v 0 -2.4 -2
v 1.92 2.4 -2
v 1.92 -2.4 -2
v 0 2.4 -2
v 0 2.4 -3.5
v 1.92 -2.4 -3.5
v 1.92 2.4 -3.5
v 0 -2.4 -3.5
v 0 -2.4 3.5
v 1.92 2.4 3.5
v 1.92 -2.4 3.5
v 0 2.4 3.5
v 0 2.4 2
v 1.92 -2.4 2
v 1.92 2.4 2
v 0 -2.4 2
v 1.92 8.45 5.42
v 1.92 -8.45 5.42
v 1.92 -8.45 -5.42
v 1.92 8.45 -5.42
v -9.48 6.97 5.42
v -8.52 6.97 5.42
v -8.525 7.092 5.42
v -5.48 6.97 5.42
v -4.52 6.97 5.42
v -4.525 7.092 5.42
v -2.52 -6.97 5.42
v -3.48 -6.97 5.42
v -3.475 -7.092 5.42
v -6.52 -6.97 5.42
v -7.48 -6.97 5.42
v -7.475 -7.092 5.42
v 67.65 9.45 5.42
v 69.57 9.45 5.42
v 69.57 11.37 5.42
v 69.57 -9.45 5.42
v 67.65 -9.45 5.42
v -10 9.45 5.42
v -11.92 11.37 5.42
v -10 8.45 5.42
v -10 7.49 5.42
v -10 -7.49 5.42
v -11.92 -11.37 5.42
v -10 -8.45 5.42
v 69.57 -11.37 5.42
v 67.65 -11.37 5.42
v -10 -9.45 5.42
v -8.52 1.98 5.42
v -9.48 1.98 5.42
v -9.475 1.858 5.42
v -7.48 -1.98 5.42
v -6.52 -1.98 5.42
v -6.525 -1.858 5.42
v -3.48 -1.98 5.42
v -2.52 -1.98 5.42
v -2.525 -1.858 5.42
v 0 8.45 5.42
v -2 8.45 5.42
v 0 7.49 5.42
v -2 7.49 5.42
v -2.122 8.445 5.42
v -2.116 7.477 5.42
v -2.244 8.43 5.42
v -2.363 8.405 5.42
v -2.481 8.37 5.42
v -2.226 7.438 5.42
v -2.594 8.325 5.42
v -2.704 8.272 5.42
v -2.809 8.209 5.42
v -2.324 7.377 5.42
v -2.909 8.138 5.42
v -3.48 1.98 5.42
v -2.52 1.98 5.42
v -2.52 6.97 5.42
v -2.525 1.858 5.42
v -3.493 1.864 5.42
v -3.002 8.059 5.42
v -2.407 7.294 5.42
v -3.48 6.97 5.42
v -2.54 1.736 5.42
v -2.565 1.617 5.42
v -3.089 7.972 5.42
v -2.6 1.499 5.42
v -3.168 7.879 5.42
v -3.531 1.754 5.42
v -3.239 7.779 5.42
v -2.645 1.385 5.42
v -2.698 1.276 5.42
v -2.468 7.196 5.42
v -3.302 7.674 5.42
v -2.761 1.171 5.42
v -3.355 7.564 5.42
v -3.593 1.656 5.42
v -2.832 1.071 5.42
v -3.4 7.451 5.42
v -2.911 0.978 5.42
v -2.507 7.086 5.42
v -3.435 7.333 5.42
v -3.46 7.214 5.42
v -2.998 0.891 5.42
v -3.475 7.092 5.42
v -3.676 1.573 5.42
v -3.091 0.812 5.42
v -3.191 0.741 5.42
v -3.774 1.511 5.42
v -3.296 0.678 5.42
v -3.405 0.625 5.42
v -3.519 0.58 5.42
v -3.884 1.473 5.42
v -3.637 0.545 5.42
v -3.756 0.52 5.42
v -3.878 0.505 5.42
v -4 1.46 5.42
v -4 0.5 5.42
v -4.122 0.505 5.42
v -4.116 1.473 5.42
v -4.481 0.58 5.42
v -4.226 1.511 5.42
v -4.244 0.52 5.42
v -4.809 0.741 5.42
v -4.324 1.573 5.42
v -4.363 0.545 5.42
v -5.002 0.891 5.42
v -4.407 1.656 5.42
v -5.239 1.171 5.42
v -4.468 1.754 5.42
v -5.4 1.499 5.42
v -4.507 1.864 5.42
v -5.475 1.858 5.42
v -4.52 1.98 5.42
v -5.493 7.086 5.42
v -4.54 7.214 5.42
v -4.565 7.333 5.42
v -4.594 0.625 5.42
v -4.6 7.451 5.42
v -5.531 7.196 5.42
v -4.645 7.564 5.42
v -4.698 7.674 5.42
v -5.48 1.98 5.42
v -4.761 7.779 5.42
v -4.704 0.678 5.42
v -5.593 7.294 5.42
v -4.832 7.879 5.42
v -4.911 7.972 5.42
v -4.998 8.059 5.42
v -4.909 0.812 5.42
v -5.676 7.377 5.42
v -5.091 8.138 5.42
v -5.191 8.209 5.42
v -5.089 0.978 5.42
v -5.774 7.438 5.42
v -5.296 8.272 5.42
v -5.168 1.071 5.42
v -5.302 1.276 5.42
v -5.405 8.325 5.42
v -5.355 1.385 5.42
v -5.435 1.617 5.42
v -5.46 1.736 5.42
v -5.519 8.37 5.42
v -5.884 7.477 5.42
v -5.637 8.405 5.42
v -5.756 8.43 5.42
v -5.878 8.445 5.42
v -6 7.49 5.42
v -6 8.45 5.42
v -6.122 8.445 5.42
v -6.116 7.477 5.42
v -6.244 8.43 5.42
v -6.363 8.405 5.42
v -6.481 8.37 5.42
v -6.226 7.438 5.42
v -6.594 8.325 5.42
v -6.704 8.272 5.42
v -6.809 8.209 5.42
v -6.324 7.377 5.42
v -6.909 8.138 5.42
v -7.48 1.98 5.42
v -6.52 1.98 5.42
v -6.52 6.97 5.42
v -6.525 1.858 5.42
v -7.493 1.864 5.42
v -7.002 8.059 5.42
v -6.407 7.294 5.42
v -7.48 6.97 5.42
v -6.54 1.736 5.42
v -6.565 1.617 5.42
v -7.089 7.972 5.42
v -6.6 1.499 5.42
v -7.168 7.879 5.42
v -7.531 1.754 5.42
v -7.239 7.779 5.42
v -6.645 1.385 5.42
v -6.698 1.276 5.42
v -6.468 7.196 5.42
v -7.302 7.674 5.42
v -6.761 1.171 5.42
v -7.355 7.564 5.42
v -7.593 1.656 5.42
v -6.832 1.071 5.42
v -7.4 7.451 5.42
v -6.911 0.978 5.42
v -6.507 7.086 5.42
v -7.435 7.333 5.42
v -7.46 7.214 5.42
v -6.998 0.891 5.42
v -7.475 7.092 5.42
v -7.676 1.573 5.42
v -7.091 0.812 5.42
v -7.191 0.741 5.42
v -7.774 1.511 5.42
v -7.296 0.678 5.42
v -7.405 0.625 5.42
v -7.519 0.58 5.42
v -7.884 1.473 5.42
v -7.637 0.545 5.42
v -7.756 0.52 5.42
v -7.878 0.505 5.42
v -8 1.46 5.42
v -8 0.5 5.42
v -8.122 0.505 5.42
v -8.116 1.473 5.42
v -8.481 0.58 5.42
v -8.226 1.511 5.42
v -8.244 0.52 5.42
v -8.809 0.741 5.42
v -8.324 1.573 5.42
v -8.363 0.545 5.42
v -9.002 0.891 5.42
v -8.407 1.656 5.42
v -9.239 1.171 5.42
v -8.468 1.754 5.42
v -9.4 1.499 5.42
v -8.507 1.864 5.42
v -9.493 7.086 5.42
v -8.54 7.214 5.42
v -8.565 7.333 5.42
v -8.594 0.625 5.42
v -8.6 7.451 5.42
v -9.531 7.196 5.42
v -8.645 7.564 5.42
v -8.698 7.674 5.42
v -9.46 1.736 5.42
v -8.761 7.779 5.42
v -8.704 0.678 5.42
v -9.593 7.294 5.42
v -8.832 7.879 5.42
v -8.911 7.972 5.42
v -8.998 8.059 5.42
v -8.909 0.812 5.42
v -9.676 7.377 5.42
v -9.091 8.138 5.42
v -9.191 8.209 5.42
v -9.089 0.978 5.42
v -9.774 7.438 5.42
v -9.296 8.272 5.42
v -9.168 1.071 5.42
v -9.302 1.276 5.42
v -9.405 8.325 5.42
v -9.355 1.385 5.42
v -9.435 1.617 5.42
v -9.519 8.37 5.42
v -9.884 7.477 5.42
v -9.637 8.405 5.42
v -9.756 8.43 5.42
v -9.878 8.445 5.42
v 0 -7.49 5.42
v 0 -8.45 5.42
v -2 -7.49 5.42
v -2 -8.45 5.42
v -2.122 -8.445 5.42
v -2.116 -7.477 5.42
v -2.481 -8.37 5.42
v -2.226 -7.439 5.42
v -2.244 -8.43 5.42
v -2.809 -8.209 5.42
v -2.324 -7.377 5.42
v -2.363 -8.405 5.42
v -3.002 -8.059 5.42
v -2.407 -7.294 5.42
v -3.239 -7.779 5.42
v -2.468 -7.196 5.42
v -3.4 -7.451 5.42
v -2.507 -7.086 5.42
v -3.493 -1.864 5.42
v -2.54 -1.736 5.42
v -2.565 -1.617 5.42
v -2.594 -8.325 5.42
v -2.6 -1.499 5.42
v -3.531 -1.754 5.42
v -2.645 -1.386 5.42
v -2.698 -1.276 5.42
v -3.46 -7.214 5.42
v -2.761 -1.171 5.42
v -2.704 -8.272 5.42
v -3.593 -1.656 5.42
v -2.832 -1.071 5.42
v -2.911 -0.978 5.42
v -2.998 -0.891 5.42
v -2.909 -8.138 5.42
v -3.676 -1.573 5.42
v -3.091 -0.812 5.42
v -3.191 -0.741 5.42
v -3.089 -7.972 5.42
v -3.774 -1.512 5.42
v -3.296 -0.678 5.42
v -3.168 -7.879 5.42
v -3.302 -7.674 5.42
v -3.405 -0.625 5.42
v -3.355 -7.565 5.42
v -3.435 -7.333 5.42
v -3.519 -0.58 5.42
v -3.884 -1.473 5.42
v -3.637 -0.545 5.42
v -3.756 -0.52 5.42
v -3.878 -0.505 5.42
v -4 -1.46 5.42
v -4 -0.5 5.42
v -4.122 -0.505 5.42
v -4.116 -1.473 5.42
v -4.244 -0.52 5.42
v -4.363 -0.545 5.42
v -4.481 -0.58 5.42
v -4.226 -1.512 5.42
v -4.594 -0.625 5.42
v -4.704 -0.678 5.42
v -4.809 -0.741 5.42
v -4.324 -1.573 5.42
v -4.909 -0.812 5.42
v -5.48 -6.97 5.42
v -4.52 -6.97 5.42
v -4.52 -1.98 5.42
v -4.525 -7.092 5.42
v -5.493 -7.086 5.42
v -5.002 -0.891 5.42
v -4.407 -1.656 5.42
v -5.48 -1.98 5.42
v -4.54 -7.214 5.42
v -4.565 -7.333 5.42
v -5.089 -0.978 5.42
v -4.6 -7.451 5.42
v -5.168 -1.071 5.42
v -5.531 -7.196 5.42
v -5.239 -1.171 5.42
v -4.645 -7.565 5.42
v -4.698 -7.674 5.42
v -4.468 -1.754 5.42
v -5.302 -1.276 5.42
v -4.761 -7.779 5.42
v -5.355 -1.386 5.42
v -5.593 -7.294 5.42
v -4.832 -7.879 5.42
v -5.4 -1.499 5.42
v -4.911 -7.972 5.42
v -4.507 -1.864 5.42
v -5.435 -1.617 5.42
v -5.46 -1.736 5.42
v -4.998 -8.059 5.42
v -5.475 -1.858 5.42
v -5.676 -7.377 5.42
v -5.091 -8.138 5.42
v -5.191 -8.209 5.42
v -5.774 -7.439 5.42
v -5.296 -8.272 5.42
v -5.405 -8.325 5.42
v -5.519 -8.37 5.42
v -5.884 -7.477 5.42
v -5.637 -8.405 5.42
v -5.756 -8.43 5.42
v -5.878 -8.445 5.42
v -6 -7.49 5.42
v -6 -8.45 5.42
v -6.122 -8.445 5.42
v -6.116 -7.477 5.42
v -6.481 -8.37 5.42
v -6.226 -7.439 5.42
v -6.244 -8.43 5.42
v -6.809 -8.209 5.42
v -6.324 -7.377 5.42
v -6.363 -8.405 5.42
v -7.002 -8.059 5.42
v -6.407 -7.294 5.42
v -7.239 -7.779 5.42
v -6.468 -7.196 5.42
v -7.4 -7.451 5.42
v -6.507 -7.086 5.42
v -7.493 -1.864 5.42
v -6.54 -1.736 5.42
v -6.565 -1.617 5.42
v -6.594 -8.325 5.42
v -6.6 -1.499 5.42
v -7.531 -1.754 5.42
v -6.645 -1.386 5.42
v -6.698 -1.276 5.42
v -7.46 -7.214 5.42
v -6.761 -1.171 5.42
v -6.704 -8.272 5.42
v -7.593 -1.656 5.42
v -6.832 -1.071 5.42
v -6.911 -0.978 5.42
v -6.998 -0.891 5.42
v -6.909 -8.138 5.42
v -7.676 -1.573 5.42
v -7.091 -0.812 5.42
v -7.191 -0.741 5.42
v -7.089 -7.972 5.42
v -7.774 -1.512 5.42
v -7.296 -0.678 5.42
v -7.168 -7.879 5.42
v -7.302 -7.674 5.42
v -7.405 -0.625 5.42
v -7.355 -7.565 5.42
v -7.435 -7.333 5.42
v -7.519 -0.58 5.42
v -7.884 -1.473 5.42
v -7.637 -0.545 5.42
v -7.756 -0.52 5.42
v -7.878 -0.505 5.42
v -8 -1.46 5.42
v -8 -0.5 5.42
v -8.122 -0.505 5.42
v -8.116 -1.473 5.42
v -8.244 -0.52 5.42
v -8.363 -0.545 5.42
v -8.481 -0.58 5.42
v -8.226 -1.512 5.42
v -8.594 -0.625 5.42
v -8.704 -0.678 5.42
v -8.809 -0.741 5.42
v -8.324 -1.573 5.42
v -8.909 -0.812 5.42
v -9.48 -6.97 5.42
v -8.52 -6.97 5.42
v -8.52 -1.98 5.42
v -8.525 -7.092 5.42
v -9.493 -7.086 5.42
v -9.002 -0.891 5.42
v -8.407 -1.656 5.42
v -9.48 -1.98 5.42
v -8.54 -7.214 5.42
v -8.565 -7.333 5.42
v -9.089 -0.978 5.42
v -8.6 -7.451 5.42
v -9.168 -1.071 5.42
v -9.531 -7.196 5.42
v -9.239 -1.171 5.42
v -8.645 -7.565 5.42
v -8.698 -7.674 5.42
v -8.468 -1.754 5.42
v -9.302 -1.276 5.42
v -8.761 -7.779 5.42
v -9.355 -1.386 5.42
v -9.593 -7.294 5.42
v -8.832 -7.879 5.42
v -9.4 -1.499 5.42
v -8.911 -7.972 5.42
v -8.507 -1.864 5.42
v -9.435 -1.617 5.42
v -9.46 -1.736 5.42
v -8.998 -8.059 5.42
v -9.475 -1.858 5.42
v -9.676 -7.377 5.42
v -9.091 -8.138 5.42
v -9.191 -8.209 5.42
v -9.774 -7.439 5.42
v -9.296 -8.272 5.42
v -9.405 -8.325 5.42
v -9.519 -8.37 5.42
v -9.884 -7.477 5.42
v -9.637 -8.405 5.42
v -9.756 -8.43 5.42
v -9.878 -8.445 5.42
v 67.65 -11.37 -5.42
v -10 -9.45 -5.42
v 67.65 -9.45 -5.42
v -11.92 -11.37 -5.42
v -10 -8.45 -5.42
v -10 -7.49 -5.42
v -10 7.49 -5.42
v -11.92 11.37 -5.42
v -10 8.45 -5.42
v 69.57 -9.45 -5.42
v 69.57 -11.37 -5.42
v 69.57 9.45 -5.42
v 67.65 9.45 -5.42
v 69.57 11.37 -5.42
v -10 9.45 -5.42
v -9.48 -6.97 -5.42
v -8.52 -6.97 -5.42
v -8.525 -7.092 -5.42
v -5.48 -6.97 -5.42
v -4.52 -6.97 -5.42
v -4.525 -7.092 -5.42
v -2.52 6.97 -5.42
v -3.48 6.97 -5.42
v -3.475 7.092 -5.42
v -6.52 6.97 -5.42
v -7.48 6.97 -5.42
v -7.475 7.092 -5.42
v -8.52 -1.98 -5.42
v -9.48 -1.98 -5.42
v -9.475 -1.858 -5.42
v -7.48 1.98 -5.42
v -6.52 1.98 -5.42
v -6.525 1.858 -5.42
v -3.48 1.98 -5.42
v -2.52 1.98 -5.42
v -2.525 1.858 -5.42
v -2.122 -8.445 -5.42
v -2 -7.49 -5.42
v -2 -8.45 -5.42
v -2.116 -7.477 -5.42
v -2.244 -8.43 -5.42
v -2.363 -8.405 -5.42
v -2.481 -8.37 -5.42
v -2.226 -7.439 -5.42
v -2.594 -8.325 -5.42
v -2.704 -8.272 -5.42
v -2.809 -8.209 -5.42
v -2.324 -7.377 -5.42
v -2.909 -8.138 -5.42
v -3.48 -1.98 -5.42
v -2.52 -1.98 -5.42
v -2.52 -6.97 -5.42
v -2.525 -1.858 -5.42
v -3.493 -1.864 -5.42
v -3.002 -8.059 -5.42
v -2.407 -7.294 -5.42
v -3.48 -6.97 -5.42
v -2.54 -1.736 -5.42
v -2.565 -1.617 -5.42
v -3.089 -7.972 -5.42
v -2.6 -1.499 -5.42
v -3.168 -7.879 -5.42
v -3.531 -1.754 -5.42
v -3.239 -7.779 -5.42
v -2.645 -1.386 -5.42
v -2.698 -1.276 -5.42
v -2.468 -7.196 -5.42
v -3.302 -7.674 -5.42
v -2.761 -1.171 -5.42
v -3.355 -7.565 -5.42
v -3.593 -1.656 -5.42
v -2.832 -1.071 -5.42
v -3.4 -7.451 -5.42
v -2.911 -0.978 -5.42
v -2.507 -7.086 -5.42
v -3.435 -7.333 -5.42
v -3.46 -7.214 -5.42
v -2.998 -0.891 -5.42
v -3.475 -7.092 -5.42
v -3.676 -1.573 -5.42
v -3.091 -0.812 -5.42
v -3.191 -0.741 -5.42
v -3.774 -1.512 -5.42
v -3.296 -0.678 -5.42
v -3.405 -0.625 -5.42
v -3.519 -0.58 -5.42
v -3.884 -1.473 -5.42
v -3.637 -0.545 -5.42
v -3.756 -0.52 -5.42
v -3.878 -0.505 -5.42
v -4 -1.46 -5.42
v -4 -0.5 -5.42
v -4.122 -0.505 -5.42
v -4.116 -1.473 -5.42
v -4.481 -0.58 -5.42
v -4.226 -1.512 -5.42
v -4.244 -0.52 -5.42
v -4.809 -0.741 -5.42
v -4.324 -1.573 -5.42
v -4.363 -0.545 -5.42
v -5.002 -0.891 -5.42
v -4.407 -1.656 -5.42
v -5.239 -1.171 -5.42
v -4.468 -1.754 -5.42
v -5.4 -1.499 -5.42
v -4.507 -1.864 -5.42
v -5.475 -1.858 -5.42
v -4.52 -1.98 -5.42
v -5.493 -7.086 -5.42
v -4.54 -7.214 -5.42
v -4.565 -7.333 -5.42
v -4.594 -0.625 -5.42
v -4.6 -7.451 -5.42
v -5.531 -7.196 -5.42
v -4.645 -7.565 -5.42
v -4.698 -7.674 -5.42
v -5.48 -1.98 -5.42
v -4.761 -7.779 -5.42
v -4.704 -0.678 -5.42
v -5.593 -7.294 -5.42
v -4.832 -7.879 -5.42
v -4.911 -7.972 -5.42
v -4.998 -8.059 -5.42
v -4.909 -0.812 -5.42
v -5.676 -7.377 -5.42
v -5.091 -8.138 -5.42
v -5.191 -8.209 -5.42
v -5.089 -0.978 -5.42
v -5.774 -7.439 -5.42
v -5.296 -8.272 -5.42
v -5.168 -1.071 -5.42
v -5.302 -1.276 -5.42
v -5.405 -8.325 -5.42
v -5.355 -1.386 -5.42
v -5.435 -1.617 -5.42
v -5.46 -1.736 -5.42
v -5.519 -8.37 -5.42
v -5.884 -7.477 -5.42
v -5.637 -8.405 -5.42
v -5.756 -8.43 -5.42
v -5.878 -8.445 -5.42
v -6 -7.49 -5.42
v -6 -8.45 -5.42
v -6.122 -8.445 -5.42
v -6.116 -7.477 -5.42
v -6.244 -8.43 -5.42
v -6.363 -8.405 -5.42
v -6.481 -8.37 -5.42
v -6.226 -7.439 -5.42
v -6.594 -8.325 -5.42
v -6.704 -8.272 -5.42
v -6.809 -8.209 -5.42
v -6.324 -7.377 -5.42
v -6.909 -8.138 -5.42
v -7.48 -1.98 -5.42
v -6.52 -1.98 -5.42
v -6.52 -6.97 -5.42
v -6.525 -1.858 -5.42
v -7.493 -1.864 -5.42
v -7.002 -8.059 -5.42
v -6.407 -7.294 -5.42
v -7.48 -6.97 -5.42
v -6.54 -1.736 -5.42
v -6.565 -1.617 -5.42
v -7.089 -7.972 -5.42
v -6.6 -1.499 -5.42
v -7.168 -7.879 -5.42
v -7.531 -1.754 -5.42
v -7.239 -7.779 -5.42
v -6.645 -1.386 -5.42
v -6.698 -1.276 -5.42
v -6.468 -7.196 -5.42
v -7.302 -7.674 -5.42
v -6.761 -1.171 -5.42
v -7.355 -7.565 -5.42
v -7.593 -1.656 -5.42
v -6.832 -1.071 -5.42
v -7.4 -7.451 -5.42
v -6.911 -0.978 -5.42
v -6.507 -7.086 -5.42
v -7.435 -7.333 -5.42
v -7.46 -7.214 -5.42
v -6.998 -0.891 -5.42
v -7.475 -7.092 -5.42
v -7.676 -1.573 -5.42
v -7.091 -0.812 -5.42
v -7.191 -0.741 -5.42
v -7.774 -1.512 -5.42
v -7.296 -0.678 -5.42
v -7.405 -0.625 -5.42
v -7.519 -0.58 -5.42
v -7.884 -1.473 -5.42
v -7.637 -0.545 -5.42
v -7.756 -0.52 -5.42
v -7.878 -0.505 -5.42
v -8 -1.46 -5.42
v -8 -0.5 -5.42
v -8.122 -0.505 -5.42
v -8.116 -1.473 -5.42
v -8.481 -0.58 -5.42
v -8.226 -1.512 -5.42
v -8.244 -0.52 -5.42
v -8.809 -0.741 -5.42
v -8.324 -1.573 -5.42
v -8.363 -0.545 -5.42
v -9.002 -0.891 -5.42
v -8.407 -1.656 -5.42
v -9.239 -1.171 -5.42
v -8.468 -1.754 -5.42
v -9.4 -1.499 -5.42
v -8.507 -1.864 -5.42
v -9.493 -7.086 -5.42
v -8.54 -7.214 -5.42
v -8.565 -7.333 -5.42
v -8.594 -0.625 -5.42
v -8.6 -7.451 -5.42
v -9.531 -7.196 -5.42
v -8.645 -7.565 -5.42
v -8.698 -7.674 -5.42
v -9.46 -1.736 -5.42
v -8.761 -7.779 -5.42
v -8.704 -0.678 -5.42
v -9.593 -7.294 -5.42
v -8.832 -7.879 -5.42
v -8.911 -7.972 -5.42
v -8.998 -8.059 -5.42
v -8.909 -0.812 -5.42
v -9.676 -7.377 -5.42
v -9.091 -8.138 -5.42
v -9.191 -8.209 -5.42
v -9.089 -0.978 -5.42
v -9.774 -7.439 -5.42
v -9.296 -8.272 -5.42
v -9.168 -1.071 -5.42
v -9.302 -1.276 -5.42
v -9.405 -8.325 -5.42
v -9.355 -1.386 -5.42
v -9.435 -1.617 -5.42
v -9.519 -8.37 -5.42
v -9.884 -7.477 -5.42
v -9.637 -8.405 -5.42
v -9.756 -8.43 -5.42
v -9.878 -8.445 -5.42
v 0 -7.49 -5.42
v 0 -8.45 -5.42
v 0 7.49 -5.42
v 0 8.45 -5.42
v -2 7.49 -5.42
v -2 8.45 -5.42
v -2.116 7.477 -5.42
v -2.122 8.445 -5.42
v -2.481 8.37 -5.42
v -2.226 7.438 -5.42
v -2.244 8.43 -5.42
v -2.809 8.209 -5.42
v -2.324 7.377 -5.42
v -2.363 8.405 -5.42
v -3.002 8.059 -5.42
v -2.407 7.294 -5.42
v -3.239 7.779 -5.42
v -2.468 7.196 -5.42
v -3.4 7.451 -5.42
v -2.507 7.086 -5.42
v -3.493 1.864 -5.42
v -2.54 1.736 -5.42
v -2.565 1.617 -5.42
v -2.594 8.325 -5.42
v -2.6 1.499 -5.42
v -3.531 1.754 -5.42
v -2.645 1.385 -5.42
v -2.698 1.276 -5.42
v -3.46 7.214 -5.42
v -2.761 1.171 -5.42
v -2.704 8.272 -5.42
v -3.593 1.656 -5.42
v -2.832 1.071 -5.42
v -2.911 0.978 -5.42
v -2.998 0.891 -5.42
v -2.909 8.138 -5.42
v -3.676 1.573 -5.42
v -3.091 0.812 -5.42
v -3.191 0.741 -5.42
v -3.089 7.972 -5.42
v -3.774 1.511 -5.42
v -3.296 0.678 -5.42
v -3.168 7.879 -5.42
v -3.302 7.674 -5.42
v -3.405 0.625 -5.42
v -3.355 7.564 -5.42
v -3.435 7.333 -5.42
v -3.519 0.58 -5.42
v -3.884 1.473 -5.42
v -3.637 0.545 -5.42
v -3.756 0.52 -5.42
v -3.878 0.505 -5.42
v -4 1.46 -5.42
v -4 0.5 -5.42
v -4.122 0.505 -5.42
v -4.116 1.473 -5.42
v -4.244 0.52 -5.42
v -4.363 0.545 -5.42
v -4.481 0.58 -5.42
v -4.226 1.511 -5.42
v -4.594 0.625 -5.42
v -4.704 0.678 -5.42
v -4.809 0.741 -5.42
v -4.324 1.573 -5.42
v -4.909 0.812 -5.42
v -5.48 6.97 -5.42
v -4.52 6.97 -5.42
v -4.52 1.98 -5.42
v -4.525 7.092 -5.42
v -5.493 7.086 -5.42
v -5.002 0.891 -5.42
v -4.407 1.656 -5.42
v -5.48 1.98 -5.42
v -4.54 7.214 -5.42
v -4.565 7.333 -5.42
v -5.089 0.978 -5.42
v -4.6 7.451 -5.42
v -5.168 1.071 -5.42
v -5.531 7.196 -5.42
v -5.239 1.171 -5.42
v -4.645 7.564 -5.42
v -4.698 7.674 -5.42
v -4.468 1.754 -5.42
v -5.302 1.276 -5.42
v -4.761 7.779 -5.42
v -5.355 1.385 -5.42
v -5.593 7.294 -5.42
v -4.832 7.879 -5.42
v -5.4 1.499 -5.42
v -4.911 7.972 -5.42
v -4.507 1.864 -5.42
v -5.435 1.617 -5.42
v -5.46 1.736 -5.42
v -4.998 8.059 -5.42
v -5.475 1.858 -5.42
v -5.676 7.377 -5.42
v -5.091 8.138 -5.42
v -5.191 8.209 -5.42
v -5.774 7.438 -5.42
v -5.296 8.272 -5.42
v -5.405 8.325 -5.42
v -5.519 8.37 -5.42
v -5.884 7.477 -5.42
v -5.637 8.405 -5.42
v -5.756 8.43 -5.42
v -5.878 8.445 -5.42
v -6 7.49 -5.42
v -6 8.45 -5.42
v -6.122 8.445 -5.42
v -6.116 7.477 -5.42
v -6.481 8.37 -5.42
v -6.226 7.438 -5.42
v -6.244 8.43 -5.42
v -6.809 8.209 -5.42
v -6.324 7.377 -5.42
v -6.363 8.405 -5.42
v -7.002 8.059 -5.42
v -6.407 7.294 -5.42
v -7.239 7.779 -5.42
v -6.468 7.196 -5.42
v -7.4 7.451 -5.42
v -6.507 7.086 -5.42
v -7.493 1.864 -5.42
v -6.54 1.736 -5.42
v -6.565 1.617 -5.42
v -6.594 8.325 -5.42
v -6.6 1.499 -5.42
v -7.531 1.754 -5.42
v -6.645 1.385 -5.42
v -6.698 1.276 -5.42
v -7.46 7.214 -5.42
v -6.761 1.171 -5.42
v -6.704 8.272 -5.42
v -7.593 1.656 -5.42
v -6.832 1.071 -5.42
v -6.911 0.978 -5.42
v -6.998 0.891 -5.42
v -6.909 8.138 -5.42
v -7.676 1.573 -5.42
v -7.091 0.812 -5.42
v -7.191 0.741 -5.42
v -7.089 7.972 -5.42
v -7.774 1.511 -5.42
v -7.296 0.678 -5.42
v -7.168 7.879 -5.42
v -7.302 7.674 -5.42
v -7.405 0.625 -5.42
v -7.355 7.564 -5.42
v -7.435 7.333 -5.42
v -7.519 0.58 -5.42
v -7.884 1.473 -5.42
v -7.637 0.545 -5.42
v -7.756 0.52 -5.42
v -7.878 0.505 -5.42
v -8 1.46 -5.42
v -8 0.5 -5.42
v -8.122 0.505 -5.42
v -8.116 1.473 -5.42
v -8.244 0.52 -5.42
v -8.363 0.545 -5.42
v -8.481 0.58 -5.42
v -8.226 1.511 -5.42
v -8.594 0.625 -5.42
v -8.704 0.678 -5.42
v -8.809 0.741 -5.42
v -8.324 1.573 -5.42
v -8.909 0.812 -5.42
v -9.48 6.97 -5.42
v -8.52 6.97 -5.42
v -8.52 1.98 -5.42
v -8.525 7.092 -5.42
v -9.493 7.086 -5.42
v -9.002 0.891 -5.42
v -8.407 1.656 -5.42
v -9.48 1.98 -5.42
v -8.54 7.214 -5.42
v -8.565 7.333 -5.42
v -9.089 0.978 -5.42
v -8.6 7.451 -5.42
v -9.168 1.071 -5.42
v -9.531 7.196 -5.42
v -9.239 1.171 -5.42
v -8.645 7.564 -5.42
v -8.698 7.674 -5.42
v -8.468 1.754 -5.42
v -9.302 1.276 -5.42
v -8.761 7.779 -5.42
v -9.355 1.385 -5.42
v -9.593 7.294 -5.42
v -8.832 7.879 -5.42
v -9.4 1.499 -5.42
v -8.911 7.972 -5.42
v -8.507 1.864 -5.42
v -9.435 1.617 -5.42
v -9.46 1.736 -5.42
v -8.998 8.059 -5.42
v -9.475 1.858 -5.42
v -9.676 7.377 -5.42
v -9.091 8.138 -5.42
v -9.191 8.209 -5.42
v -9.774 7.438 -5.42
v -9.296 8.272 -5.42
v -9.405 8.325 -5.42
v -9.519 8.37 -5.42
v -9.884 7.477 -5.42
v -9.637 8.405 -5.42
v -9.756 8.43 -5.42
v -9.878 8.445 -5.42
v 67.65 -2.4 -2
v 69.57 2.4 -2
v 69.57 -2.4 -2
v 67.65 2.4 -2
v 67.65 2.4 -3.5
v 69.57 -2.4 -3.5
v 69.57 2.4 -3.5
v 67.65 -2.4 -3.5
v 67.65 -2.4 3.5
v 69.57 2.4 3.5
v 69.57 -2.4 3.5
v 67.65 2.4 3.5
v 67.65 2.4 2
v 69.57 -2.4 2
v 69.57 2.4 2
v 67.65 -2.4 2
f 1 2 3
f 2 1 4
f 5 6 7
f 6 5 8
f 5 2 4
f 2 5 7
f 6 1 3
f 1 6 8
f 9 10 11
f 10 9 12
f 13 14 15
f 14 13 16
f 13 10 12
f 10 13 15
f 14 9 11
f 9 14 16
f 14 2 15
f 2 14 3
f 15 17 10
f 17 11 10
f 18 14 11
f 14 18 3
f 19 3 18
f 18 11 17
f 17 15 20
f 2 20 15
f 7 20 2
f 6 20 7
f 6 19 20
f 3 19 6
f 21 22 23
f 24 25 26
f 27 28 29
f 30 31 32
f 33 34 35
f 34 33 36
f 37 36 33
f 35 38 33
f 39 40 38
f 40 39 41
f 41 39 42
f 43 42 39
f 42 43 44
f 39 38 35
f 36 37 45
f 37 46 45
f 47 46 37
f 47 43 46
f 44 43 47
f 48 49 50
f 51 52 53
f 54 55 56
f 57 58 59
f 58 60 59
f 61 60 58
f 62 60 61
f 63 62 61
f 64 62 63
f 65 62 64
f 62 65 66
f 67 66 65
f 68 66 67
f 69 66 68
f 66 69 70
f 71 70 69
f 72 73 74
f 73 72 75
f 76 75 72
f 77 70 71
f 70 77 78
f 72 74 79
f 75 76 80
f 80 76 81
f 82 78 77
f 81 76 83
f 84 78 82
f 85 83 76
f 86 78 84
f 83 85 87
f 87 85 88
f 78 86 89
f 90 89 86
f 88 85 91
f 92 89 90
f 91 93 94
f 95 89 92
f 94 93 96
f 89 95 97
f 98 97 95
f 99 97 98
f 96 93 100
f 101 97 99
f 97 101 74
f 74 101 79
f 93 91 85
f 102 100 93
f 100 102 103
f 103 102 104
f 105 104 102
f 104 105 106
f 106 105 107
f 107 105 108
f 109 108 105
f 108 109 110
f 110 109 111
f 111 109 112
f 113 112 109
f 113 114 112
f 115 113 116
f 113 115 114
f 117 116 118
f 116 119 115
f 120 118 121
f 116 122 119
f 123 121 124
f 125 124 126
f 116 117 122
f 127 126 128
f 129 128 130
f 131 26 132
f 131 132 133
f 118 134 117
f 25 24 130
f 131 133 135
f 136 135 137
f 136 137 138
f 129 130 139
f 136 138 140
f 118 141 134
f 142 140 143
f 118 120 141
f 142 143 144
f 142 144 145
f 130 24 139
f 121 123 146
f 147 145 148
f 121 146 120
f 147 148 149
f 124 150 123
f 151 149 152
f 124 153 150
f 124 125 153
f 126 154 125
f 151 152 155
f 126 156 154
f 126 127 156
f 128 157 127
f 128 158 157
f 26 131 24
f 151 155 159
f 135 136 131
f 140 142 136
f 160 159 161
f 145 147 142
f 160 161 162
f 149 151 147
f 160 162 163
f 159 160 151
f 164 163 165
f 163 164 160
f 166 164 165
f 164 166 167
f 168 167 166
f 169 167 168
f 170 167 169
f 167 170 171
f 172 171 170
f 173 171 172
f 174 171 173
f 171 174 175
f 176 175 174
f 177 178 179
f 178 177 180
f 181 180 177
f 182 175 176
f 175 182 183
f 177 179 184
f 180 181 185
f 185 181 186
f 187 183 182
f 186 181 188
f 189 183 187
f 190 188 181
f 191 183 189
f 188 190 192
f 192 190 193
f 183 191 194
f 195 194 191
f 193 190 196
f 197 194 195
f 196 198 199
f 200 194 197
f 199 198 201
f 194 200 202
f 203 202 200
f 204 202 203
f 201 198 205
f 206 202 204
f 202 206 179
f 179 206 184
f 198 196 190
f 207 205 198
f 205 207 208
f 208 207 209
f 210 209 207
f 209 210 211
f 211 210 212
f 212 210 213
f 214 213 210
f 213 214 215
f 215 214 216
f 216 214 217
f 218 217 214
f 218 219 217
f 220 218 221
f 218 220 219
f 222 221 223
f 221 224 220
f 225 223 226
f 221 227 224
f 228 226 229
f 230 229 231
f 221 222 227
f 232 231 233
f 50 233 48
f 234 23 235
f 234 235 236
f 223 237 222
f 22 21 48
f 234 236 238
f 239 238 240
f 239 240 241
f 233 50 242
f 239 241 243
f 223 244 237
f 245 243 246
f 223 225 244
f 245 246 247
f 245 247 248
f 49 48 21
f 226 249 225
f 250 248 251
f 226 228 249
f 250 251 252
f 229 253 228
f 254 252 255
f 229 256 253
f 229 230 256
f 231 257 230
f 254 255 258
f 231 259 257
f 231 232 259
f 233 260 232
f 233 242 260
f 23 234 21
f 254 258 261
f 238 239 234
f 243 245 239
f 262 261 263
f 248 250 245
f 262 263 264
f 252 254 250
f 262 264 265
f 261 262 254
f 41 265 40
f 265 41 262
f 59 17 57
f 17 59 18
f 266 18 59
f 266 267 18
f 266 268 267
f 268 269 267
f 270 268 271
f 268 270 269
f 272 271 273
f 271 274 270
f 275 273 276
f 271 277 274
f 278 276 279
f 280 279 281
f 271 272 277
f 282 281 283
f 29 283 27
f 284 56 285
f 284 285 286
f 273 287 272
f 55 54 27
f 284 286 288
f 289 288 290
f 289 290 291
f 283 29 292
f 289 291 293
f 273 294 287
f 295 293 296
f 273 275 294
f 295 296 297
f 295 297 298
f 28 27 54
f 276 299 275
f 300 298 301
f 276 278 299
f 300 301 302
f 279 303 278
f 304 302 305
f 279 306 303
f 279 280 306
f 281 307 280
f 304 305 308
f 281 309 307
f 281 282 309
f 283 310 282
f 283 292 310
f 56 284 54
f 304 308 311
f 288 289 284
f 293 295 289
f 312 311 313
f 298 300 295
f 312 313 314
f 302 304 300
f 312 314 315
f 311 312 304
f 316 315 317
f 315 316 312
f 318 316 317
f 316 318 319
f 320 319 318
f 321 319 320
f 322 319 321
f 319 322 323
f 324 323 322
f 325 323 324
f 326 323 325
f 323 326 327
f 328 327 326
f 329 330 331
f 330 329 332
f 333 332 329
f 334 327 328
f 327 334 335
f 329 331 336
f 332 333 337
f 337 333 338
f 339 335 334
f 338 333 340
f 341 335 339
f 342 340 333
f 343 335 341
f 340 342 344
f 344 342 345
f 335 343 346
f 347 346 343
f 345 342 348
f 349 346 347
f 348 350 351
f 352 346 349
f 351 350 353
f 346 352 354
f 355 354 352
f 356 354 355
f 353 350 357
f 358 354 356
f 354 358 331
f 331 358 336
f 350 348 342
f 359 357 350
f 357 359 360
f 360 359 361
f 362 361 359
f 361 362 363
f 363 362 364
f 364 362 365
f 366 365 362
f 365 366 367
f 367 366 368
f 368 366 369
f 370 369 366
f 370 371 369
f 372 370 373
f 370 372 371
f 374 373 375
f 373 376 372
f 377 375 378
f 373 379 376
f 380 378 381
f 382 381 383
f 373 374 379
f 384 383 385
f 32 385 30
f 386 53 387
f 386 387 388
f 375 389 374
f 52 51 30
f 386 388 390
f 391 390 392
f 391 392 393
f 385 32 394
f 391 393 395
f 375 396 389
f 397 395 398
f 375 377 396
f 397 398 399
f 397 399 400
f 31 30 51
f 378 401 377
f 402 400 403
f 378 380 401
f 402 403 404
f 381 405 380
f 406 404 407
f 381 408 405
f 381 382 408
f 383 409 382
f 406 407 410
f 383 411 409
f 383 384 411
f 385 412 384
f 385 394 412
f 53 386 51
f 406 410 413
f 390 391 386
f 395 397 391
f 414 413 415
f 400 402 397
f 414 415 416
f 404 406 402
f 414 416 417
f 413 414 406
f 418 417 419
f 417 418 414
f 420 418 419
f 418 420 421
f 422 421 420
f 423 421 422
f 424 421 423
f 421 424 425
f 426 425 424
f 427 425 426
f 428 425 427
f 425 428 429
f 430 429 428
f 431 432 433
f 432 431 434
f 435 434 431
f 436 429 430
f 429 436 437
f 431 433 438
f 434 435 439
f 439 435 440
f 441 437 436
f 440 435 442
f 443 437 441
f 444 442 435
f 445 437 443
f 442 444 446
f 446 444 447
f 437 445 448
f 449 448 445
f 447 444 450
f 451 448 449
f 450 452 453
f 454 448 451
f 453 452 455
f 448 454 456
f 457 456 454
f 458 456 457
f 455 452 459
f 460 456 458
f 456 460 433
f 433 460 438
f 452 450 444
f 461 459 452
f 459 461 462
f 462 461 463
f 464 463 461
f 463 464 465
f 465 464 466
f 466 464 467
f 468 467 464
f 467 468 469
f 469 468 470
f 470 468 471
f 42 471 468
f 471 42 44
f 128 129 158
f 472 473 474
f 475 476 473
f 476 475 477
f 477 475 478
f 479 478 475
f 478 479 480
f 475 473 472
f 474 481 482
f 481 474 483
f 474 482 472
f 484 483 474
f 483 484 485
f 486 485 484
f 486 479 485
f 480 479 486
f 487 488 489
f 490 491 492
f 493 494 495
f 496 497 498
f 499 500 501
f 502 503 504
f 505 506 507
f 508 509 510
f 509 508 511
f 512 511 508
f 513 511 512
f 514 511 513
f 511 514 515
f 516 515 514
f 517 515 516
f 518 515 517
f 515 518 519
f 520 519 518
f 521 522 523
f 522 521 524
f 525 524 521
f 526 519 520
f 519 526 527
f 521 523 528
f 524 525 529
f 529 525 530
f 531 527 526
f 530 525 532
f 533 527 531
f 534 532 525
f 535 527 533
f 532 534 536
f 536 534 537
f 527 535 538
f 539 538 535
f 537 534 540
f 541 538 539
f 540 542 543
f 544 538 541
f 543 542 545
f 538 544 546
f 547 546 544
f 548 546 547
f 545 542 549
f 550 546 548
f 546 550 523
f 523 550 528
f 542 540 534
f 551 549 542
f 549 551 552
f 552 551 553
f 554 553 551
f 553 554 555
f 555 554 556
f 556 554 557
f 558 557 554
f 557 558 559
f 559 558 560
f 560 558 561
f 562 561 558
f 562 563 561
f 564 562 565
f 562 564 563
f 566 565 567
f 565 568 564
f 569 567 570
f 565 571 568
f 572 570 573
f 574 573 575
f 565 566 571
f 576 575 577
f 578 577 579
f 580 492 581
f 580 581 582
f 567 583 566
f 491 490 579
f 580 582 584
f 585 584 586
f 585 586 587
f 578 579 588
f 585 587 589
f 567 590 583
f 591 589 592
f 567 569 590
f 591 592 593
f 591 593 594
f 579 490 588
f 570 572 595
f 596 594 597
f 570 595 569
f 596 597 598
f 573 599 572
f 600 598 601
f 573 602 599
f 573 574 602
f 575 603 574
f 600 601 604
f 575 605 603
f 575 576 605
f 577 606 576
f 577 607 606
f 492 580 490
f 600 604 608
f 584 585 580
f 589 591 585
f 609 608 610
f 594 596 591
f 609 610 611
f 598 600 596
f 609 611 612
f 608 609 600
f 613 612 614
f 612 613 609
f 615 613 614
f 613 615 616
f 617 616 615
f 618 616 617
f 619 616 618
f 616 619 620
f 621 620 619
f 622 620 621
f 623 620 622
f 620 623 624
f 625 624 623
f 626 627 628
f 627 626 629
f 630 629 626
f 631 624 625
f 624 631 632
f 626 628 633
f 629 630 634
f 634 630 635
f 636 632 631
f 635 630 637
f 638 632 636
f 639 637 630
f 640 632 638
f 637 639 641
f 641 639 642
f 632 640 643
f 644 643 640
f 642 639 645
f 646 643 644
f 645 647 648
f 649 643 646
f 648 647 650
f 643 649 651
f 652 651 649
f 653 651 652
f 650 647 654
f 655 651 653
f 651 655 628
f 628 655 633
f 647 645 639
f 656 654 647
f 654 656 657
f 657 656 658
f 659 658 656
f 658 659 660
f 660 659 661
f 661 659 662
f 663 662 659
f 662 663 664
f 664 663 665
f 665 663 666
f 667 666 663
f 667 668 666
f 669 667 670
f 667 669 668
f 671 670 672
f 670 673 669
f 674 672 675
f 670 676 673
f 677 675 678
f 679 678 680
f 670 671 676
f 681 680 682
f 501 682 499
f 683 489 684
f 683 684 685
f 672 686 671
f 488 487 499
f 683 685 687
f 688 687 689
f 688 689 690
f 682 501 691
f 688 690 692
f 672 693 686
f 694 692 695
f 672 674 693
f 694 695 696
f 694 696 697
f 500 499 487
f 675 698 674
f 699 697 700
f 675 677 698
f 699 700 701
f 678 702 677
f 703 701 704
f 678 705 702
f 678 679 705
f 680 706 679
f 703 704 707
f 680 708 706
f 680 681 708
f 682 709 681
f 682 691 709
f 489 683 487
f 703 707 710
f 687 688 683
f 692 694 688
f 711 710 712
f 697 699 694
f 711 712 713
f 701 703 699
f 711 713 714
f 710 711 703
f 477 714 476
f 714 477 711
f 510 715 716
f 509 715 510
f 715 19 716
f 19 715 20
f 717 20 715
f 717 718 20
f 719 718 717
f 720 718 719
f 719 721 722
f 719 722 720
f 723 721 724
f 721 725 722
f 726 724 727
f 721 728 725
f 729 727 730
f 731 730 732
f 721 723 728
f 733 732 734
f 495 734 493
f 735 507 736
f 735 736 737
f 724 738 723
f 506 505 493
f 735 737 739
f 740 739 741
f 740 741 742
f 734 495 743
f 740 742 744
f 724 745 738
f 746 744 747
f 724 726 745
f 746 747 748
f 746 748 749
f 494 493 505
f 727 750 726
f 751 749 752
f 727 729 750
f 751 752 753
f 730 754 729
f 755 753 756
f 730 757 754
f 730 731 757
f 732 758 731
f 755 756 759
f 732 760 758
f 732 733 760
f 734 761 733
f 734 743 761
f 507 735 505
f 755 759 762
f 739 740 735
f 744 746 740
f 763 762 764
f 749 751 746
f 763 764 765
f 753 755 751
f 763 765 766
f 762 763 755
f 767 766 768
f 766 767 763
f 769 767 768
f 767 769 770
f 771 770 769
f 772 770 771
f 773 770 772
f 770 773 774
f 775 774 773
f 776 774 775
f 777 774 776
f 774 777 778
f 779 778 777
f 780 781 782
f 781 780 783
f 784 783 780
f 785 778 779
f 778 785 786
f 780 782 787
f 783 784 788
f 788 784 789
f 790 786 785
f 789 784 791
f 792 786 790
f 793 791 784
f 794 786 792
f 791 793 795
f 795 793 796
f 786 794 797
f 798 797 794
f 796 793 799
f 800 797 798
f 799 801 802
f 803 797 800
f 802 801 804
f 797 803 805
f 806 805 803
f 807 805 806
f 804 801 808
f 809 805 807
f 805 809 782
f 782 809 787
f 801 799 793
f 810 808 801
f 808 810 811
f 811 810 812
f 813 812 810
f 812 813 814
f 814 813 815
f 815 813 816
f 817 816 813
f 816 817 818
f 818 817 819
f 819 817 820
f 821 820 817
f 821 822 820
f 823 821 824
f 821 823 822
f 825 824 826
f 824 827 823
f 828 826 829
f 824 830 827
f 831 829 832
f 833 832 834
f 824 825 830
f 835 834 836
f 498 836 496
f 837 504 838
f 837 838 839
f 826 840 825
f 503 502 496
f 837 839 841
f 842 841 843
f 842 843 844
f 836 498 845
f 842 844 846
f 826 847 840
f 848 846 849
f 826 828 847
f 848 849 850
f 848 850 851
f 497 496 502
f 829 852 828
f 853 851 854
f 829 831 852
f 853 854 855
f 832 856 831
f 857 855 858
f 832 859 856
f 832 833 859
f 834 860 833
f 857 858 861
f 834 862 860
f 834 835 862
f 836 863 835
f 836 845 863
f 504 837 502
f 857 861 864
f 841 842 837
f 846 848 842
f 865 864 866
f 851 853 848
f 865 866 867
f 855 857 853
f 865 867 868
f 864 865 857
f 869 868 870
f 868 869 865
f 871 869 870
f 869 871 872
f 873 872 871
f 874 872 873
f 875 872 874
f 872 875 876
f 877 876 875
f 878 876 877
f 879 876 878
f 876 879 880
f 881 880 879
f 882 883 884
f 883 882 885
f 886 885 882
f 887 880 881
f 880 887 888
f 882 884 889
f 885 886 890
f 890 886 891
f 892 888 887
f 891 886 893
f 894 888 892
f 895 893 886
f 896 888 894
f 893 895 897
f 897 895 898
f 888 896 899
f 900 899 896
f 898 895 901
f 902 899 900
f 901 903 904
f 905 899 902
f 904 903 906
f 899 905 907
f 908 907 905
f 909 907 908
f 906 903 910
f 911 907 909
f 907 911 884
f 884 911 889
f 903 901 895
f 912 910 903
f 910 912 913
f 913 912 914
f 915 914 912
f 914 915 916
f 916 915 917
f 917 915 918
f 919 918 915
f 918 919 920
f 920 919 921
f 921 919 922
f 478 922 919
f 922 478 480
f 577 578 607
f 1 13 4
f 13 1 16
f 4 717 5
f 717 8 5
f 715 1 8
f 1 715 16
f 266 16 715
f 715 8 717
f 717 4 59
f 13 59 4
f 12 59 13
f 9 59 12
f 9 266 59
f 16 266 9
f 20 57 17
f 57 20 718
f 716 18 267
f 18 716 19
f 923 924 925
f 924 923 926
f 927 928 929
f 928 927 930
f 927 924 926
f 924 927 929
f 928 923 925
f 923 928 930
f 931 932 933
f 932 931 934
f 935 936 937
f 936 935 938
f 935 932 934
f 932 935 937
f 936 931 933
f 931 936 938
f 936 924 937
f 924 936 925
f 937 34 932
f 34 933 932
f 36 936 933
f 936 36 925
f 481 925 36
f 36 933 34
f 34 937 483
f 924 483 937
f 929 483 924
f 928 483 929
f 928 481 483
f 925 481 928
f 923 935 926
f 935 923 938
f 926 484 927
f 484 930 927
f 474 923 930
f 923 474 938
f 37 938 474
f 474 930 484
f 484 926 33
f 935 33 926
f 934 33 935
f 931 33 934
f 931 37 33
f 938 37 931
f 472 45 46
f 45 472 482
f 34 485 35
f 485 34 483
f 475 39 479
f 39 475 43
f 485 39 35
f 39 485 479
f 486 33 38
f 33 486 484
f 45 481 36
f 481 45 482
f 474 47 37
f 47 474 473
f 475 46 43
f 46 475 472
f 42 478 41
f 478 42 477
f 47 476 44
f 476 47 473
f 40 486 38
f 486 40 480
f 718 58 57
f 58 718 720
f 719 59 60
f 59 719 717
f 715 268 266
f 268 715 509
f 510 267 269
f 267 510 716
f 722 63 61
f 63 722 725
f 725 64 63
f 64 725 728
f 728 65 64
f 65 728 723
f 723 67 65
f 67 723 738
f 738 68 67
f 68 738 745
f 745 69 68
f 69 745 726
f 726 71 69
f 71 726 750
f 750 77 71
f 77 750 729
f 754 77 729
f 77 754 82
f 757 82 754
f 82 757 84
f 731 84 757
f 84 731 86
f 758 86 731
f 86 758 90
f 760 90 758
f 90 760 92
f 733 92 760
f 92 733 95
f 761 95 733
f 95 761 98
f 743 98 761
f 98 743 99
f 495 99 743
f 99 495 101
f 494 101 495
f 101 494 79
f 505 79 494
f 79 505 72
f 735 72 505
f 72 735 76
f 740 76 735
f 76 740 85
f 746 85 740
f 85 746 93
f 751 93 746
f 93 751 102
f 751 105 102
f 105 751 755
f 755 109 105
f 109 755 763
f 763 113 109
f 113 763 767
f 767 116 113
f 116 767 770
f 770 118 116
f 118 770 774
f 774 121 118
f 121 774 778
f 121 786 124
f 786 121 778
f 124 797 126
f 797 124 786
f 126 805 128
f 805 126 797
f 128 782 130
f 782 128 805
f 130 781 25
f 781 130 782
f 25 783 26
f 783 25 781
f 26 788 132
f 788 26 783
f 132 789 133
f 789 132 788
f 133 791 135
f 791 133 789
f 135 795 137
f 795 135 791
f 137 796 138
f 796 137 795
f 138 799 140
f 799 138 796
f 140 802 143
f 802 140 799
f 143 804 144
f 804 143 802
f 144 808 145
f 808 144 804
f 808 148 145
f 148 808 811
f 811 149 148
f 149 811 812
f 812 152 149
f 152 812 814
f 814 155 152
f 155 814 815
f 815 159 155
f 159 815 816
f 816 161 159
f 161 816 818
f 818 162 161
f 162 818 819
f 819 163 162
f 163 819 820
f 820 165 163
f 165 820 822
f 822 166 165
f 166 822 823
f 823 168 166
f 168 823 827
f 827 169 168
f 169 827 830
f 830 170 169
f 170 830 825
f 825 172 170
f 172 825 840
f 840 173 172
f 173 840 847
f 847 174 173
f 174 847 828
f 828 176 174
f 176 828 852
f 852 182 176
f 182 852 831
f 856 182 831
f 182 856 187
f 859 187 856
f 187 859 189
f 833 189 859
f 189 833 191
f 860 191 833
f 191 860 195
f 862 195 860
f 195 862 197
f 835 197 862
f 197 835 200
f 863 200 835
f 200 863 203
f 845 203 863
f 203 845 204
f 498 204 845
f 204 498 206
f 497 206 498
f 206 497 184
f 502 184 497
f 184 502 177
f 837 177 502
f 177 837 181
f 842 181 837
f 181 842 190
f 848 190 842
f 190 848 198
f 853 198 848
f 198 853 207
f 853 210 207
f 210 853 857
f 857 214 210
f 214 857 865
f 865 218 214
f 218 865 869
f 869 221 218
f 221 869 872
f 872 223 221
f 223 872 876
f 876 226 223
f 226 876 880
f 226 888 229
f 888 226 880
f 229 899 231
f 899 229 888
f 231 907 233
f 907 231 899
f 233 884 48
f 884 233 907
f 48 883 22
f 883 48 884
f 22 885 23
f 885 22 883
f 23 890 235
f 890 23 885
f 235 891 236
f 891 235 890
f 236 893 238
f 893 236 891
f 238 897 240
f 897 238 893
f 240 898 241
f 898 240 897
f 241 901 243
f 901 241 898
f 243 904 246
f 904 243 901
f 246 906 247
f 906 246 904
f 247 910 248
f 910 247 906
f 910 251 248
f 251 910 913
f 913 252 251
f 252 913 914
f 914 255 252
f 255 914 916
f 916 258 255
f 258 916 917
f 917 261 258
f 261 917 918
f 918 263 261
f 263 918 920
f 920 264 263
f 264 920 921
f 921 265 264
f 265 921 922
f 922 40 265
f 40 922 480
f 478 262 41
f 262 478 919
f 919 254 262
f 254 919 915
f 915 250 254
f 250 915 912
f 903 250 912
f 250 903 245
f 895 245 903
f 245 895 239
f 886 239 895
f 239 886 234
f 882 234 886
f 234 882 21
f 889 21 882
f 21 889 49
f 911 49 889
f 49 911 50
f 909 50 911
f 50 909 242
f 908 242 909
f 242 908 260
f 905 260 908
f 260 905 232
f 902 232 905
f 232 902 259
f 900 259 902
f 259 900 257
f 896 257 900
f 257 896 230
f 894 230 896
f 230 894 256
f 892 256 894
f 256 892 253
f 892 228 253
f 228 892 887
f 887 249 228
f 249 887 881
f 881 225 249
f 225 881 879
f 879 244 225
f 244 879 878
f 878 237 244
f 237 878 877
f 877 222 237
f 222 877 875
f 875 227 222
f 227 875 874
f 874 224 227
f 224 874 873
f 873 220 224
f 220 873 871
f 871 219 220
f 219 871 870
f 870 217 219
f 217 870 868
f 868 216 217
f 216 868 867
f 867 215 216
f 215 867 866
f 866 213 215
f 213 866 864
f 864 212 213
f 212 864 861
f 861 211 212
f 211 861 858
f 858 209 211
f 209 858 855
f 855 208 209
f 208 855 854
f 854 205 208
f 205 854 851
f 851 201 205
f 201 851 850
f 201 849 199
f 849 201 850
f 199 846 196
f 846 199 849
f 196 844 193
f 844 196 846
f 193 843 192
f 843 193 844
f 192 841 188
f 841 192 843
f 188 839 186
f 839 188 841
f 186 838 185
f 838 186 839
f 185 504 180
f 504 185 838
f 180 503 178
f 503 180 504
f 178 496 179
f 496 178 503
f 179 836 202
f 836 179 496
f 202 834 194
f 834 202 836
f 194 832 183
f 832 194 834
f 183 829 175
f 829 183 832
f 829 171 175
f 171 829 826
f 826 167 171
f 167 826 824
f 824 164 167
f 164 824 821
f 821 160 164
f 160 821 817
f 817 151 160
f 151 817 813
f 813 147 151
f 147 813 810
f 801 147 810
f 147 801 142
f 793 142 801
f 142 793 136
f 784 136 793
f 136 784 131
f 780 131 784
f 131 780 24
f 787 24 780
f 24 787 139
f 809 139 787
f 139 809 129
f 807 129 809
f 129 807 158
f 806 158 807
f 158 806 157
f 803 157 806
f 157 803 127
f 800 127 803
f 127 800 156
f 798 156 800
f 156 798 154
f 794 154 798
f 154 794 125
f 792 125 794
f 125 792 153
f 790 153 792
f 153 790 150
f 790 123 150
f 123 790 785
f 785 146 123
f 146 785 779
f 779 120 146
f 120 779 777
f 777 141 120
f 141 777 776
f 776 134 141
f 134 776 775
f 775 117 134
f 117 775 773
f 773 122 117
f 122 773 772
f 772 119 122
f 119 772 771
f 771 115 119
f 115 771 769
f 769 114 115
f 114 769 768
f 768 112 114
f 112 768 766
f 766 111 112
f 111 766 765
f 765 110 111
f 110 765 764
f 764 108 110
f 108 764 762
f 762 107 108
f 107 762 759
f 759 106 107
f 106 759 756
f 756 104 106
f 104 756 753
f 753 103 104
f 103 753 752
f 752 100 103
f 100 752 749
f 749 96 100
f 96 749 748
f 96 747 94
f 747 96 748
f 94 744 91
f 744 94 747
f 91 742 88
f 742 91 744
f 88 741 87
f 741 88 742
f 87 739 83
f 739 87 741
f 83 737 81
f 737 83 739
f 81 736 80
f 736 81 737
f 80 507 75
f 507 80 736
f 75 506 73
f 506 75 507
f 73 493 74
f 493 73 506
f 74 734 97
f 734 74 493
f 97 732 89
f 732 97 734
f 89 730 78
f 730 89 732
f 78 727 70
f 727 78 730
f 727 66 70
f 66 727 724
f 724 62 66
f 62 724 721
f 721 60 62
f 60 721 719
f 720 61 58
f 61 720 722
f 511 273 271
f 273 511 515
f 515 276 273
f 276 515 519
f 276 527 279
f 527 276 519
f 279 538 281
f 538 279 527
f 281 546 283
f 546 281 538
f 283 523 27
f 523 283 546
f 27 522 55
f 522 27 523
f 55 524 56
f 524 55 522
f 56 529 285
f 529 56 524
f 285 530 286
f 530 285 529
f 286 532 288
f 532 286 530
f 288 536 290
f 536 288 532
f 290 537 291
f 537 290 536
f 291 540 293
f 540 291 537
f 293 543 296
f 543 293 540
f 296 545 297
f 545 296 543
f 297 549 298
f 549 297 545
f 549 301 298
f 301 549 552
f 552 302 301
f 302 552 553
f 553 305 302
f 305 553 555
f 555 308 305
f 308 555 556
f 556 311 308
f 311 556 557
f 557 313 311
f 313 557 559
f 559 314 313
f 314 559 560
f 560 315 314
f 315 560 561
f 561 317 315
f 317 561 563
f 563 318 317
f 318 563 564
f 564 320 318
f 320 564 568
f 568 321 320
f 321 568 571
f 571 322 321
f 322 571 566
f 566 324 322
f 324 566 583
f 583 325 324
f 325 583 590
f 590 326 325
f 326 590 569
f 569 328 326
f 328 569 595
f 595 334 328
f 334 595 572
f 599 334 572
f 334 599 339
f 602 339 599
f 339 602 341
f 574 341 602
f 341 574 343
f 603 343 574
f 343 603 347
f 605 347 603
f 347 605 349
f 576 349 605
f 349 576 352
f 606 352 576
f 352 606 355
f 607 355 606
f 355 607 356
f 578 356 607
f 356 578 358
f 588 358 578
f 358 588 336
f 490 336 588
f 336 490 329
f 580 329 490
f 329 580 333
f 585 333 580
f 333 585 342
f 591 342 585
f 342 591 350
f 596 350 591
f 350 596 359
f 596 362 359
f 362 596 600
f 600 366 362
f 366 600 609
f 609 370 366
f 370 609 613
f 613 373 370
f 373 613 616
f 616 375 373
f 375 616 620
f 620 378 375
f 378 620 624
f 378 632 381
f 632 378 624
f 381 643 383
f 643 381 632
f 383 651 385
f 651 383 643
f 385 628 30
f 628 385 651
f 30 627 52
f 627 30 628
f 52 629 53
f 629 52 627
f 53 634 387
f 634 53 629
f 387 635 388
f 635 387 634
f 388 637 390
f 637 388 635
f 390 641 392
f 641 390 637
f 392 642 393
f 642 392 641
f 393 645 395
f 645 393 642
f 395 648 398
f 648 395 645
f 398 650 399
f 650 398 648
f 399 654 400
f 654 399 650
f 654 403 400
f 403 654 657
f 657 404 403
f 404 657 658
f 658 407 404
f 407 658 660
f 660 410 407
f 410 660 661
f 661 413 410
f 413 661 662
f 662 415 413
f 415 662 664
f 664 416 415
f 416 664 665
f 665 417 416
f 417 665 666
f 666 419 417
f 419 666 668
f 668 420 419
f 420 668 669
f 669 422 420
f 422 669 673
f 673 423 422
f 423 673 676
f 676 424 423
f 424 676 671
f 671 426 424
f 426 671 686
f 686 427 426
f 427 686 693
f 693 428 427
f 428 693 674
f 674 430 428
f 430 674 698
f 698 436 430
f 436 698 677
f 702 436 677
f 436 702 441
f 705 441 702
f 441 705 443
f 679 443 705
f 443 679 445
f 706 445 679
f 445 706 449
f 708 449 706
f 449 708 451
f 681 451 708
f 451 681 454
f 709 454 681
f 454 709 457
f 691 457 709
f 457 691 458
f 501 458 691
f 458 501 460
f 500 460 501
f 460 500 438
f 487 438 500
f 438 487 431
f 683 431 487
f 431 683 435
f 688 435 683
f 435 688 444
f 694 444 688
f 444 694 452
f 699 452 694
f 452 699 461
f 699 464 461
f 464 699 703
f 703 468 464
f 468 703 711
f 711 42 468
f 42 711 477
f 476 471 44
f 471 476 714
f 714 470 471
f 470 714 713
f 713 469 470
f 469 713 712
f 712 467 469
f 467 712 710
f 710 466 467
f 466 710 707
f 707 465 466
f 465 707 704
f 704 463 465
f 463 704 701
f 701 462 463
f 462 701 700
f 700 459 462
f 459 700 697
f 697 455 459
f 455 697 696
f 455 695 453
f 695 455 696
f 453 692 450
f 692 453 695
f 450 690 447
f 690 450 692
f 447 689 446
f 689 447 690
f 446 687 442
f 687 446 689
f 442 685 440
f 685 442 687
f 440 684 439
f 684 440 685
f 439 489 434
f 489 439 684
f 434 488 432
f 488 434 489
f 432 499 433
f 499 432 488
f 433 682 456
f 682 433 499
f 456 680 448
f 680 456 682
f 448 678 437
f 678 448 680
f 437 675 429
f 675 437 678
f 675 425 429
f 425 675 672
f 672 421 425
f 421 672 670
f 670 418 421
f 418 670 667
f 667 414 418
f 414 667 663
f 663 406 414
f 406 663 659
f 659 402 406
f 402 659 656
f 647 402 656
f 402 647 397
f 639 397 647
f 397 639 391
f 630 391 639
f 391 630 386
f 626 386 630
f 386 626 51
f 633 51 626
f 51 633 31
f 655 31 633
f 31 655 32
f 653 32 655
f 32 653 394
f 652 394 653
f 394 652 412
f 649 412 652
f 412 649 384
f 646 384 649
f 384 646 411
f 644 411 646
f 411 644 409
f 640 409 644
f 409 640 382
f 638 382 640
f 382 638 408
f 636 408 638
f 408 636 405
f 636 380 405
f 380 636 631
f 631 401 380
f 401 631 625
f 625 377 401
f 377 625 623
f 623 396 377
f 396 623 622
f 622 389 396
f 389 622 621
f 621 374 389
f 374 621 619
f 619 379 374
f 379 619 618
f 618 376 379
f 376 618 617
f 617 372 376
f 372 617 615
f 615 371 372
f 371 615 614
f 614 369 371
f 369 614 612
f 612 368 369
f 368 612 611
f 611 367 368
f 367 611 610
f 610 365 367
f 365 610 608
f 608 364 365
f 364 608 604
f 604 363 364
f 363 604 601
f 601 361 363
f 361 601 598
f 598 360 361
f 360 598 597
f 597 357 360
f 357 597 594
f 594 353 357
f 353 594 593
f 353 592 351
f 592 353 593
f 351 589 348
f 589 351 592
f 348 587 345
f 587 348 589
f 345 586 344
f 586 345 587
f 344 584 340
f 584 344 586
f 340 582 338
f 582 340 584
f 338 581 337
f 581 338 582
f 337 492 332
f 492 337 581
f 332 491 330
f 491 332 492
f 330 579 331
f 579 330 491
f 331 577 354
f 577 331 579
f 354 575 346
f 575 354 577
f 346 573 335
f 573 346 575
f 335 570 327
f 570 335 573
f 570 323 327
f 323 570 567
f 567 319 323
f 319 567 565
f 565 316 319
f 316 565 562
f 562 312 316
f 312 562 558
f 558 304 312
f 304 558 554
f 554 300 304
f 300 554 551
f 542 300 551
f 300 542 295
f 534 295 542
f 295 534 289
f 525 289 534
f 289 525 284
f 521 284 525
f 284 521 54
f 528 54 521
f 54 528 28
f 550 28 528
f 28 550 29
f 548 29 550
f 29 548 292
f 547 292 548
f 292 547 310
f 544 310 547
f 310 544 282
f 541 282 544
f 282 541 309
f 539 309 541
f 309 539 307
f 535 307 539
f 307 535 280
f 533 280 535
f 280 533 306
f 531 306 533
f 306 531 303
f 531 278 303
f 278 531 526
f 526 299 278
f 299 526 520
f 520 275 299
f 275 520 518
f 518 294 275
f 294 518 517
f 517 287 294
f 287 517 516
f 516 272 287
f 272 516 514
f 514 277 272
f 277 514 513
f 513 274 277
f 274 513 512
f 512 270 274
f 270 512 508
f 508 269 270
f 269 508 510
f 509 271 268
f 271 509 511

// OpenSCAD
$fa = 0.5;
$fs = 0.5;

function closest_dim(dim, full_dim) = dim*floor(full_dim / dim);

// print extrusion width
extrusion_width = 0.48;

// battery length (including tolerance)
battery_length = 66 + 0.4;

// battery diameter (including tolerance)
battery_dia = 18.5 + 0.4;

// battery plus length
battery_plus_length = 1.25;

// battery plus diameter
battery_plus_dia = 6;

// battery minus diameter
battery_minus_dia = 12;

// tape width (including tolerance)
tape_width = 0.6 * 8;

// tape thickness
tape_thickness = 1.5;

// wall thickness
wall_thickness = extrusion_width*4;

// amount of snakes in springs
spring_snakes = 4;

// total spring length
spring_length = 8;

spring_thickness = extrusion_width * 2;

// width of single spring
spring_width = battery_dia / 2 - 2;

// distance between spring and positive pole
spring_pole_space = 2;

// distance between springs and walls
spring_base_space = 1;

// base holder length
holder_length = battery_length + battery_plus_length + spring_length + spring_pole_space + wall_thickness * 2;

tape_hole_distance = 4;

// base holder height
holder_height = tape_hole_distance + tape_thickness * 2 + wall_thickness * 2;


module battery() {
    color("yellow") difference() {
        cylinder(d=battery_dia,h=battery_length);
        translate([0,0,-1])
        cylinder(d = battery_minus_dia, h=2);
    }
    color("gray") cylinder(d=battery_minus_dia,h=1);
    color("gray") translate([0,0,battery_length-1]) cylinder(d=battery_plus_dia,h=battery_plus_length+1);
}


function arc(radius, start, angle = 0, end = 0, center = [0,0], last = true) = let(
    diff = angle != 0 ? angle : end - start,
    n = $fn > 0 ? max($fn, 3) : max(ceil(min(abs(diff) / $fa, 2*PI*radius / $fs)), 5)
) [ for (i=[0:last  ? n : n -1]) let(a = start+i*diff/n) [ cos(a), sin(a) ] * radius + center ];


module spring(thickness, n_snakes, length, width, l_first=true) {
    
    snake_length = length / n_snakes;
    radius_big = (snake_length+thickness)/2;
    radius_small = radius_big - thickness;
    
    lr=l_first ? 0 : 1;
    left = radius_big;
    right = width-radius_big;
    
    points = concat([
        for (i=[0:n_snakes-1]) let(last = (i == n_snakes-1)) each (i + lr) % 2 == 0 
            ? concat(arc(radius_big, 180, -90, center=[left, i*snake_length]), arc(radius_small, 270, +90, center=[right, (i+1)*snake_length], last=last))
            : concat(arc(radius_small, 0, +90, center=[right, i*snake_length]), arc(radius_big, 270, -90, center=[left, (i+1)*snake_length], last=last)),
        for (i=[n_snakes-1:-1:0]) let(last = (i == 0)) each (i + lr) % 2 == 0 
            ? concat(arc(radius_big, 360, -90, center=[right, (i+1)*snake_length]), arc(radius_small, 90, +90, center=[left, i*snake_length], last=last))
            : concat(arc(radius_small, 180, +90, center=[left, (i+1)*snake_length]), arc(radius_big, 90, -90, center=[right, i*snake_length], last=last))
    ]);
        
    polygon(points);
}

module holder() {


    // left
    translate([-wall_thickness -spring_pole_space - spring_length, battery_dia/2,0])
    cube([holder_length, wall_thickness, holder_height]);

    // right
    translate([-wall_thickness -spring_pole_space - spring_length, -battery_dia/2-wall_thickness,0])
    cube([holder_length, wall_thickness, holder_height]);

    // negative pole wall
    translate([-wall_thickness -spring_pole_space - spring_length, -battery_dia/2-wall_thickness,0])
    cube([wall_thickness, battery_dia + wall_thickness * 2, holder_height]);


    // left spring spacer
    translate([-spring_pole_space, battery_dia/2-spring_base_space-spring_thickness,0])
    cube([spring_pole_space, spring_thickness, holder_height]);

    // right spring spacer
    translate([-spring_pole_space, -battery_dia/2+spring_base_space,0])
    cube([spring_pole_space , spring_thickness, holder_height]);

    // left spring
    linear_extrude(holder_height)
    translate([-spring_pole_space, spring_base_space*0.5])
    rotate(90)
    spring(spring_thickness, spring_snakes, spring_length, battery_dia/2 - spring_base_space*1.5, false);

    // right spring
    linear_extrude(holder_height)
    translate([-spring_pole_space ,-battery_dia/2 + 1])
    rotate(90)
    spring(spring_thickness, spring_snakes, spring_length, battery_dia/2 - spring_base_space*1.5, true);
        
    // negative pole
    translate([0, -battery_dia/2 + spring_base_space,0])
    difference() {
        cube([wall_thickness, battery_dia - spring_base_space*2, holder_height]);
        translate([-1,(battery_dia - spring_base_space*2 - tape_width)/2, wall_thickness]) {
            cube([wall_thickness + 2, tape_width, tape_thickness]);
            translate([0,0,tape_thickness + tape_hole_distance])
            cube([wall_thickness + 2, tape_width, tape_thickness]);
        }
    }
    
    // positive pole
    translate([battery_length + battery_plus_length, -battery_dia/2-wall_thickness,0])
    difference() {
        cube([wall_thickness, battery_dia + wall_thickness * 2, holder_height]);
        translate([-1, (battery_dia - tape_width)/2 + wall_thickness, wall_thickness]) {
            cube([wall_thickness + 2, tape_width, tape_thickness]);
            translate([0,0,tape_thickness + tape_hole_distance])
            cube([wall_thickness + 2, tape_width, tape_thickness]);
        }
    }
    
    /*
    holder_leg_length = 10;
    holder_leg_height = 8;
    
    
    translate([0, battery_dia/2+wall_thickness, holder_height])
    rotate([40,0,0])
    translate([0,-wall_thickness,0])
    cube([holder_leg_length, wall_thickness, holder_leg_height]);
    
    translate([0, -battery_dia/2-wall_thickness, holder_height])
    rotate([-40,0,0])
    //translate([0,-wall_thickness,0])
    cube([holder_leg_length, wall_thickness, holder_leg_height]);
    
    translate([battery_length - holder_leg_length, battery_dia/2+wall_thickness, holder_height])
    rotate([40,0,0])
    translate([0,-wall_thickness,0])
    cube([holder_leg_length, wall_thickness, holder_leg_height]);
    
    translate([battery_length - holder_leg_length, -battery_dia/2-wall_thickness, holder_height])
    rotate([-40,0,0])
    //translate([0,-wall_thickness,0])
    cube([holder_leg_length, wall_thickness, holder_leg_height]);*/
    

}





*translate([0,0,0])
rotate([0,90,0])
battery();

translate([0,0,-holder_height/2])
holder();

//rotate([90,0,0])
//holder_mini();
